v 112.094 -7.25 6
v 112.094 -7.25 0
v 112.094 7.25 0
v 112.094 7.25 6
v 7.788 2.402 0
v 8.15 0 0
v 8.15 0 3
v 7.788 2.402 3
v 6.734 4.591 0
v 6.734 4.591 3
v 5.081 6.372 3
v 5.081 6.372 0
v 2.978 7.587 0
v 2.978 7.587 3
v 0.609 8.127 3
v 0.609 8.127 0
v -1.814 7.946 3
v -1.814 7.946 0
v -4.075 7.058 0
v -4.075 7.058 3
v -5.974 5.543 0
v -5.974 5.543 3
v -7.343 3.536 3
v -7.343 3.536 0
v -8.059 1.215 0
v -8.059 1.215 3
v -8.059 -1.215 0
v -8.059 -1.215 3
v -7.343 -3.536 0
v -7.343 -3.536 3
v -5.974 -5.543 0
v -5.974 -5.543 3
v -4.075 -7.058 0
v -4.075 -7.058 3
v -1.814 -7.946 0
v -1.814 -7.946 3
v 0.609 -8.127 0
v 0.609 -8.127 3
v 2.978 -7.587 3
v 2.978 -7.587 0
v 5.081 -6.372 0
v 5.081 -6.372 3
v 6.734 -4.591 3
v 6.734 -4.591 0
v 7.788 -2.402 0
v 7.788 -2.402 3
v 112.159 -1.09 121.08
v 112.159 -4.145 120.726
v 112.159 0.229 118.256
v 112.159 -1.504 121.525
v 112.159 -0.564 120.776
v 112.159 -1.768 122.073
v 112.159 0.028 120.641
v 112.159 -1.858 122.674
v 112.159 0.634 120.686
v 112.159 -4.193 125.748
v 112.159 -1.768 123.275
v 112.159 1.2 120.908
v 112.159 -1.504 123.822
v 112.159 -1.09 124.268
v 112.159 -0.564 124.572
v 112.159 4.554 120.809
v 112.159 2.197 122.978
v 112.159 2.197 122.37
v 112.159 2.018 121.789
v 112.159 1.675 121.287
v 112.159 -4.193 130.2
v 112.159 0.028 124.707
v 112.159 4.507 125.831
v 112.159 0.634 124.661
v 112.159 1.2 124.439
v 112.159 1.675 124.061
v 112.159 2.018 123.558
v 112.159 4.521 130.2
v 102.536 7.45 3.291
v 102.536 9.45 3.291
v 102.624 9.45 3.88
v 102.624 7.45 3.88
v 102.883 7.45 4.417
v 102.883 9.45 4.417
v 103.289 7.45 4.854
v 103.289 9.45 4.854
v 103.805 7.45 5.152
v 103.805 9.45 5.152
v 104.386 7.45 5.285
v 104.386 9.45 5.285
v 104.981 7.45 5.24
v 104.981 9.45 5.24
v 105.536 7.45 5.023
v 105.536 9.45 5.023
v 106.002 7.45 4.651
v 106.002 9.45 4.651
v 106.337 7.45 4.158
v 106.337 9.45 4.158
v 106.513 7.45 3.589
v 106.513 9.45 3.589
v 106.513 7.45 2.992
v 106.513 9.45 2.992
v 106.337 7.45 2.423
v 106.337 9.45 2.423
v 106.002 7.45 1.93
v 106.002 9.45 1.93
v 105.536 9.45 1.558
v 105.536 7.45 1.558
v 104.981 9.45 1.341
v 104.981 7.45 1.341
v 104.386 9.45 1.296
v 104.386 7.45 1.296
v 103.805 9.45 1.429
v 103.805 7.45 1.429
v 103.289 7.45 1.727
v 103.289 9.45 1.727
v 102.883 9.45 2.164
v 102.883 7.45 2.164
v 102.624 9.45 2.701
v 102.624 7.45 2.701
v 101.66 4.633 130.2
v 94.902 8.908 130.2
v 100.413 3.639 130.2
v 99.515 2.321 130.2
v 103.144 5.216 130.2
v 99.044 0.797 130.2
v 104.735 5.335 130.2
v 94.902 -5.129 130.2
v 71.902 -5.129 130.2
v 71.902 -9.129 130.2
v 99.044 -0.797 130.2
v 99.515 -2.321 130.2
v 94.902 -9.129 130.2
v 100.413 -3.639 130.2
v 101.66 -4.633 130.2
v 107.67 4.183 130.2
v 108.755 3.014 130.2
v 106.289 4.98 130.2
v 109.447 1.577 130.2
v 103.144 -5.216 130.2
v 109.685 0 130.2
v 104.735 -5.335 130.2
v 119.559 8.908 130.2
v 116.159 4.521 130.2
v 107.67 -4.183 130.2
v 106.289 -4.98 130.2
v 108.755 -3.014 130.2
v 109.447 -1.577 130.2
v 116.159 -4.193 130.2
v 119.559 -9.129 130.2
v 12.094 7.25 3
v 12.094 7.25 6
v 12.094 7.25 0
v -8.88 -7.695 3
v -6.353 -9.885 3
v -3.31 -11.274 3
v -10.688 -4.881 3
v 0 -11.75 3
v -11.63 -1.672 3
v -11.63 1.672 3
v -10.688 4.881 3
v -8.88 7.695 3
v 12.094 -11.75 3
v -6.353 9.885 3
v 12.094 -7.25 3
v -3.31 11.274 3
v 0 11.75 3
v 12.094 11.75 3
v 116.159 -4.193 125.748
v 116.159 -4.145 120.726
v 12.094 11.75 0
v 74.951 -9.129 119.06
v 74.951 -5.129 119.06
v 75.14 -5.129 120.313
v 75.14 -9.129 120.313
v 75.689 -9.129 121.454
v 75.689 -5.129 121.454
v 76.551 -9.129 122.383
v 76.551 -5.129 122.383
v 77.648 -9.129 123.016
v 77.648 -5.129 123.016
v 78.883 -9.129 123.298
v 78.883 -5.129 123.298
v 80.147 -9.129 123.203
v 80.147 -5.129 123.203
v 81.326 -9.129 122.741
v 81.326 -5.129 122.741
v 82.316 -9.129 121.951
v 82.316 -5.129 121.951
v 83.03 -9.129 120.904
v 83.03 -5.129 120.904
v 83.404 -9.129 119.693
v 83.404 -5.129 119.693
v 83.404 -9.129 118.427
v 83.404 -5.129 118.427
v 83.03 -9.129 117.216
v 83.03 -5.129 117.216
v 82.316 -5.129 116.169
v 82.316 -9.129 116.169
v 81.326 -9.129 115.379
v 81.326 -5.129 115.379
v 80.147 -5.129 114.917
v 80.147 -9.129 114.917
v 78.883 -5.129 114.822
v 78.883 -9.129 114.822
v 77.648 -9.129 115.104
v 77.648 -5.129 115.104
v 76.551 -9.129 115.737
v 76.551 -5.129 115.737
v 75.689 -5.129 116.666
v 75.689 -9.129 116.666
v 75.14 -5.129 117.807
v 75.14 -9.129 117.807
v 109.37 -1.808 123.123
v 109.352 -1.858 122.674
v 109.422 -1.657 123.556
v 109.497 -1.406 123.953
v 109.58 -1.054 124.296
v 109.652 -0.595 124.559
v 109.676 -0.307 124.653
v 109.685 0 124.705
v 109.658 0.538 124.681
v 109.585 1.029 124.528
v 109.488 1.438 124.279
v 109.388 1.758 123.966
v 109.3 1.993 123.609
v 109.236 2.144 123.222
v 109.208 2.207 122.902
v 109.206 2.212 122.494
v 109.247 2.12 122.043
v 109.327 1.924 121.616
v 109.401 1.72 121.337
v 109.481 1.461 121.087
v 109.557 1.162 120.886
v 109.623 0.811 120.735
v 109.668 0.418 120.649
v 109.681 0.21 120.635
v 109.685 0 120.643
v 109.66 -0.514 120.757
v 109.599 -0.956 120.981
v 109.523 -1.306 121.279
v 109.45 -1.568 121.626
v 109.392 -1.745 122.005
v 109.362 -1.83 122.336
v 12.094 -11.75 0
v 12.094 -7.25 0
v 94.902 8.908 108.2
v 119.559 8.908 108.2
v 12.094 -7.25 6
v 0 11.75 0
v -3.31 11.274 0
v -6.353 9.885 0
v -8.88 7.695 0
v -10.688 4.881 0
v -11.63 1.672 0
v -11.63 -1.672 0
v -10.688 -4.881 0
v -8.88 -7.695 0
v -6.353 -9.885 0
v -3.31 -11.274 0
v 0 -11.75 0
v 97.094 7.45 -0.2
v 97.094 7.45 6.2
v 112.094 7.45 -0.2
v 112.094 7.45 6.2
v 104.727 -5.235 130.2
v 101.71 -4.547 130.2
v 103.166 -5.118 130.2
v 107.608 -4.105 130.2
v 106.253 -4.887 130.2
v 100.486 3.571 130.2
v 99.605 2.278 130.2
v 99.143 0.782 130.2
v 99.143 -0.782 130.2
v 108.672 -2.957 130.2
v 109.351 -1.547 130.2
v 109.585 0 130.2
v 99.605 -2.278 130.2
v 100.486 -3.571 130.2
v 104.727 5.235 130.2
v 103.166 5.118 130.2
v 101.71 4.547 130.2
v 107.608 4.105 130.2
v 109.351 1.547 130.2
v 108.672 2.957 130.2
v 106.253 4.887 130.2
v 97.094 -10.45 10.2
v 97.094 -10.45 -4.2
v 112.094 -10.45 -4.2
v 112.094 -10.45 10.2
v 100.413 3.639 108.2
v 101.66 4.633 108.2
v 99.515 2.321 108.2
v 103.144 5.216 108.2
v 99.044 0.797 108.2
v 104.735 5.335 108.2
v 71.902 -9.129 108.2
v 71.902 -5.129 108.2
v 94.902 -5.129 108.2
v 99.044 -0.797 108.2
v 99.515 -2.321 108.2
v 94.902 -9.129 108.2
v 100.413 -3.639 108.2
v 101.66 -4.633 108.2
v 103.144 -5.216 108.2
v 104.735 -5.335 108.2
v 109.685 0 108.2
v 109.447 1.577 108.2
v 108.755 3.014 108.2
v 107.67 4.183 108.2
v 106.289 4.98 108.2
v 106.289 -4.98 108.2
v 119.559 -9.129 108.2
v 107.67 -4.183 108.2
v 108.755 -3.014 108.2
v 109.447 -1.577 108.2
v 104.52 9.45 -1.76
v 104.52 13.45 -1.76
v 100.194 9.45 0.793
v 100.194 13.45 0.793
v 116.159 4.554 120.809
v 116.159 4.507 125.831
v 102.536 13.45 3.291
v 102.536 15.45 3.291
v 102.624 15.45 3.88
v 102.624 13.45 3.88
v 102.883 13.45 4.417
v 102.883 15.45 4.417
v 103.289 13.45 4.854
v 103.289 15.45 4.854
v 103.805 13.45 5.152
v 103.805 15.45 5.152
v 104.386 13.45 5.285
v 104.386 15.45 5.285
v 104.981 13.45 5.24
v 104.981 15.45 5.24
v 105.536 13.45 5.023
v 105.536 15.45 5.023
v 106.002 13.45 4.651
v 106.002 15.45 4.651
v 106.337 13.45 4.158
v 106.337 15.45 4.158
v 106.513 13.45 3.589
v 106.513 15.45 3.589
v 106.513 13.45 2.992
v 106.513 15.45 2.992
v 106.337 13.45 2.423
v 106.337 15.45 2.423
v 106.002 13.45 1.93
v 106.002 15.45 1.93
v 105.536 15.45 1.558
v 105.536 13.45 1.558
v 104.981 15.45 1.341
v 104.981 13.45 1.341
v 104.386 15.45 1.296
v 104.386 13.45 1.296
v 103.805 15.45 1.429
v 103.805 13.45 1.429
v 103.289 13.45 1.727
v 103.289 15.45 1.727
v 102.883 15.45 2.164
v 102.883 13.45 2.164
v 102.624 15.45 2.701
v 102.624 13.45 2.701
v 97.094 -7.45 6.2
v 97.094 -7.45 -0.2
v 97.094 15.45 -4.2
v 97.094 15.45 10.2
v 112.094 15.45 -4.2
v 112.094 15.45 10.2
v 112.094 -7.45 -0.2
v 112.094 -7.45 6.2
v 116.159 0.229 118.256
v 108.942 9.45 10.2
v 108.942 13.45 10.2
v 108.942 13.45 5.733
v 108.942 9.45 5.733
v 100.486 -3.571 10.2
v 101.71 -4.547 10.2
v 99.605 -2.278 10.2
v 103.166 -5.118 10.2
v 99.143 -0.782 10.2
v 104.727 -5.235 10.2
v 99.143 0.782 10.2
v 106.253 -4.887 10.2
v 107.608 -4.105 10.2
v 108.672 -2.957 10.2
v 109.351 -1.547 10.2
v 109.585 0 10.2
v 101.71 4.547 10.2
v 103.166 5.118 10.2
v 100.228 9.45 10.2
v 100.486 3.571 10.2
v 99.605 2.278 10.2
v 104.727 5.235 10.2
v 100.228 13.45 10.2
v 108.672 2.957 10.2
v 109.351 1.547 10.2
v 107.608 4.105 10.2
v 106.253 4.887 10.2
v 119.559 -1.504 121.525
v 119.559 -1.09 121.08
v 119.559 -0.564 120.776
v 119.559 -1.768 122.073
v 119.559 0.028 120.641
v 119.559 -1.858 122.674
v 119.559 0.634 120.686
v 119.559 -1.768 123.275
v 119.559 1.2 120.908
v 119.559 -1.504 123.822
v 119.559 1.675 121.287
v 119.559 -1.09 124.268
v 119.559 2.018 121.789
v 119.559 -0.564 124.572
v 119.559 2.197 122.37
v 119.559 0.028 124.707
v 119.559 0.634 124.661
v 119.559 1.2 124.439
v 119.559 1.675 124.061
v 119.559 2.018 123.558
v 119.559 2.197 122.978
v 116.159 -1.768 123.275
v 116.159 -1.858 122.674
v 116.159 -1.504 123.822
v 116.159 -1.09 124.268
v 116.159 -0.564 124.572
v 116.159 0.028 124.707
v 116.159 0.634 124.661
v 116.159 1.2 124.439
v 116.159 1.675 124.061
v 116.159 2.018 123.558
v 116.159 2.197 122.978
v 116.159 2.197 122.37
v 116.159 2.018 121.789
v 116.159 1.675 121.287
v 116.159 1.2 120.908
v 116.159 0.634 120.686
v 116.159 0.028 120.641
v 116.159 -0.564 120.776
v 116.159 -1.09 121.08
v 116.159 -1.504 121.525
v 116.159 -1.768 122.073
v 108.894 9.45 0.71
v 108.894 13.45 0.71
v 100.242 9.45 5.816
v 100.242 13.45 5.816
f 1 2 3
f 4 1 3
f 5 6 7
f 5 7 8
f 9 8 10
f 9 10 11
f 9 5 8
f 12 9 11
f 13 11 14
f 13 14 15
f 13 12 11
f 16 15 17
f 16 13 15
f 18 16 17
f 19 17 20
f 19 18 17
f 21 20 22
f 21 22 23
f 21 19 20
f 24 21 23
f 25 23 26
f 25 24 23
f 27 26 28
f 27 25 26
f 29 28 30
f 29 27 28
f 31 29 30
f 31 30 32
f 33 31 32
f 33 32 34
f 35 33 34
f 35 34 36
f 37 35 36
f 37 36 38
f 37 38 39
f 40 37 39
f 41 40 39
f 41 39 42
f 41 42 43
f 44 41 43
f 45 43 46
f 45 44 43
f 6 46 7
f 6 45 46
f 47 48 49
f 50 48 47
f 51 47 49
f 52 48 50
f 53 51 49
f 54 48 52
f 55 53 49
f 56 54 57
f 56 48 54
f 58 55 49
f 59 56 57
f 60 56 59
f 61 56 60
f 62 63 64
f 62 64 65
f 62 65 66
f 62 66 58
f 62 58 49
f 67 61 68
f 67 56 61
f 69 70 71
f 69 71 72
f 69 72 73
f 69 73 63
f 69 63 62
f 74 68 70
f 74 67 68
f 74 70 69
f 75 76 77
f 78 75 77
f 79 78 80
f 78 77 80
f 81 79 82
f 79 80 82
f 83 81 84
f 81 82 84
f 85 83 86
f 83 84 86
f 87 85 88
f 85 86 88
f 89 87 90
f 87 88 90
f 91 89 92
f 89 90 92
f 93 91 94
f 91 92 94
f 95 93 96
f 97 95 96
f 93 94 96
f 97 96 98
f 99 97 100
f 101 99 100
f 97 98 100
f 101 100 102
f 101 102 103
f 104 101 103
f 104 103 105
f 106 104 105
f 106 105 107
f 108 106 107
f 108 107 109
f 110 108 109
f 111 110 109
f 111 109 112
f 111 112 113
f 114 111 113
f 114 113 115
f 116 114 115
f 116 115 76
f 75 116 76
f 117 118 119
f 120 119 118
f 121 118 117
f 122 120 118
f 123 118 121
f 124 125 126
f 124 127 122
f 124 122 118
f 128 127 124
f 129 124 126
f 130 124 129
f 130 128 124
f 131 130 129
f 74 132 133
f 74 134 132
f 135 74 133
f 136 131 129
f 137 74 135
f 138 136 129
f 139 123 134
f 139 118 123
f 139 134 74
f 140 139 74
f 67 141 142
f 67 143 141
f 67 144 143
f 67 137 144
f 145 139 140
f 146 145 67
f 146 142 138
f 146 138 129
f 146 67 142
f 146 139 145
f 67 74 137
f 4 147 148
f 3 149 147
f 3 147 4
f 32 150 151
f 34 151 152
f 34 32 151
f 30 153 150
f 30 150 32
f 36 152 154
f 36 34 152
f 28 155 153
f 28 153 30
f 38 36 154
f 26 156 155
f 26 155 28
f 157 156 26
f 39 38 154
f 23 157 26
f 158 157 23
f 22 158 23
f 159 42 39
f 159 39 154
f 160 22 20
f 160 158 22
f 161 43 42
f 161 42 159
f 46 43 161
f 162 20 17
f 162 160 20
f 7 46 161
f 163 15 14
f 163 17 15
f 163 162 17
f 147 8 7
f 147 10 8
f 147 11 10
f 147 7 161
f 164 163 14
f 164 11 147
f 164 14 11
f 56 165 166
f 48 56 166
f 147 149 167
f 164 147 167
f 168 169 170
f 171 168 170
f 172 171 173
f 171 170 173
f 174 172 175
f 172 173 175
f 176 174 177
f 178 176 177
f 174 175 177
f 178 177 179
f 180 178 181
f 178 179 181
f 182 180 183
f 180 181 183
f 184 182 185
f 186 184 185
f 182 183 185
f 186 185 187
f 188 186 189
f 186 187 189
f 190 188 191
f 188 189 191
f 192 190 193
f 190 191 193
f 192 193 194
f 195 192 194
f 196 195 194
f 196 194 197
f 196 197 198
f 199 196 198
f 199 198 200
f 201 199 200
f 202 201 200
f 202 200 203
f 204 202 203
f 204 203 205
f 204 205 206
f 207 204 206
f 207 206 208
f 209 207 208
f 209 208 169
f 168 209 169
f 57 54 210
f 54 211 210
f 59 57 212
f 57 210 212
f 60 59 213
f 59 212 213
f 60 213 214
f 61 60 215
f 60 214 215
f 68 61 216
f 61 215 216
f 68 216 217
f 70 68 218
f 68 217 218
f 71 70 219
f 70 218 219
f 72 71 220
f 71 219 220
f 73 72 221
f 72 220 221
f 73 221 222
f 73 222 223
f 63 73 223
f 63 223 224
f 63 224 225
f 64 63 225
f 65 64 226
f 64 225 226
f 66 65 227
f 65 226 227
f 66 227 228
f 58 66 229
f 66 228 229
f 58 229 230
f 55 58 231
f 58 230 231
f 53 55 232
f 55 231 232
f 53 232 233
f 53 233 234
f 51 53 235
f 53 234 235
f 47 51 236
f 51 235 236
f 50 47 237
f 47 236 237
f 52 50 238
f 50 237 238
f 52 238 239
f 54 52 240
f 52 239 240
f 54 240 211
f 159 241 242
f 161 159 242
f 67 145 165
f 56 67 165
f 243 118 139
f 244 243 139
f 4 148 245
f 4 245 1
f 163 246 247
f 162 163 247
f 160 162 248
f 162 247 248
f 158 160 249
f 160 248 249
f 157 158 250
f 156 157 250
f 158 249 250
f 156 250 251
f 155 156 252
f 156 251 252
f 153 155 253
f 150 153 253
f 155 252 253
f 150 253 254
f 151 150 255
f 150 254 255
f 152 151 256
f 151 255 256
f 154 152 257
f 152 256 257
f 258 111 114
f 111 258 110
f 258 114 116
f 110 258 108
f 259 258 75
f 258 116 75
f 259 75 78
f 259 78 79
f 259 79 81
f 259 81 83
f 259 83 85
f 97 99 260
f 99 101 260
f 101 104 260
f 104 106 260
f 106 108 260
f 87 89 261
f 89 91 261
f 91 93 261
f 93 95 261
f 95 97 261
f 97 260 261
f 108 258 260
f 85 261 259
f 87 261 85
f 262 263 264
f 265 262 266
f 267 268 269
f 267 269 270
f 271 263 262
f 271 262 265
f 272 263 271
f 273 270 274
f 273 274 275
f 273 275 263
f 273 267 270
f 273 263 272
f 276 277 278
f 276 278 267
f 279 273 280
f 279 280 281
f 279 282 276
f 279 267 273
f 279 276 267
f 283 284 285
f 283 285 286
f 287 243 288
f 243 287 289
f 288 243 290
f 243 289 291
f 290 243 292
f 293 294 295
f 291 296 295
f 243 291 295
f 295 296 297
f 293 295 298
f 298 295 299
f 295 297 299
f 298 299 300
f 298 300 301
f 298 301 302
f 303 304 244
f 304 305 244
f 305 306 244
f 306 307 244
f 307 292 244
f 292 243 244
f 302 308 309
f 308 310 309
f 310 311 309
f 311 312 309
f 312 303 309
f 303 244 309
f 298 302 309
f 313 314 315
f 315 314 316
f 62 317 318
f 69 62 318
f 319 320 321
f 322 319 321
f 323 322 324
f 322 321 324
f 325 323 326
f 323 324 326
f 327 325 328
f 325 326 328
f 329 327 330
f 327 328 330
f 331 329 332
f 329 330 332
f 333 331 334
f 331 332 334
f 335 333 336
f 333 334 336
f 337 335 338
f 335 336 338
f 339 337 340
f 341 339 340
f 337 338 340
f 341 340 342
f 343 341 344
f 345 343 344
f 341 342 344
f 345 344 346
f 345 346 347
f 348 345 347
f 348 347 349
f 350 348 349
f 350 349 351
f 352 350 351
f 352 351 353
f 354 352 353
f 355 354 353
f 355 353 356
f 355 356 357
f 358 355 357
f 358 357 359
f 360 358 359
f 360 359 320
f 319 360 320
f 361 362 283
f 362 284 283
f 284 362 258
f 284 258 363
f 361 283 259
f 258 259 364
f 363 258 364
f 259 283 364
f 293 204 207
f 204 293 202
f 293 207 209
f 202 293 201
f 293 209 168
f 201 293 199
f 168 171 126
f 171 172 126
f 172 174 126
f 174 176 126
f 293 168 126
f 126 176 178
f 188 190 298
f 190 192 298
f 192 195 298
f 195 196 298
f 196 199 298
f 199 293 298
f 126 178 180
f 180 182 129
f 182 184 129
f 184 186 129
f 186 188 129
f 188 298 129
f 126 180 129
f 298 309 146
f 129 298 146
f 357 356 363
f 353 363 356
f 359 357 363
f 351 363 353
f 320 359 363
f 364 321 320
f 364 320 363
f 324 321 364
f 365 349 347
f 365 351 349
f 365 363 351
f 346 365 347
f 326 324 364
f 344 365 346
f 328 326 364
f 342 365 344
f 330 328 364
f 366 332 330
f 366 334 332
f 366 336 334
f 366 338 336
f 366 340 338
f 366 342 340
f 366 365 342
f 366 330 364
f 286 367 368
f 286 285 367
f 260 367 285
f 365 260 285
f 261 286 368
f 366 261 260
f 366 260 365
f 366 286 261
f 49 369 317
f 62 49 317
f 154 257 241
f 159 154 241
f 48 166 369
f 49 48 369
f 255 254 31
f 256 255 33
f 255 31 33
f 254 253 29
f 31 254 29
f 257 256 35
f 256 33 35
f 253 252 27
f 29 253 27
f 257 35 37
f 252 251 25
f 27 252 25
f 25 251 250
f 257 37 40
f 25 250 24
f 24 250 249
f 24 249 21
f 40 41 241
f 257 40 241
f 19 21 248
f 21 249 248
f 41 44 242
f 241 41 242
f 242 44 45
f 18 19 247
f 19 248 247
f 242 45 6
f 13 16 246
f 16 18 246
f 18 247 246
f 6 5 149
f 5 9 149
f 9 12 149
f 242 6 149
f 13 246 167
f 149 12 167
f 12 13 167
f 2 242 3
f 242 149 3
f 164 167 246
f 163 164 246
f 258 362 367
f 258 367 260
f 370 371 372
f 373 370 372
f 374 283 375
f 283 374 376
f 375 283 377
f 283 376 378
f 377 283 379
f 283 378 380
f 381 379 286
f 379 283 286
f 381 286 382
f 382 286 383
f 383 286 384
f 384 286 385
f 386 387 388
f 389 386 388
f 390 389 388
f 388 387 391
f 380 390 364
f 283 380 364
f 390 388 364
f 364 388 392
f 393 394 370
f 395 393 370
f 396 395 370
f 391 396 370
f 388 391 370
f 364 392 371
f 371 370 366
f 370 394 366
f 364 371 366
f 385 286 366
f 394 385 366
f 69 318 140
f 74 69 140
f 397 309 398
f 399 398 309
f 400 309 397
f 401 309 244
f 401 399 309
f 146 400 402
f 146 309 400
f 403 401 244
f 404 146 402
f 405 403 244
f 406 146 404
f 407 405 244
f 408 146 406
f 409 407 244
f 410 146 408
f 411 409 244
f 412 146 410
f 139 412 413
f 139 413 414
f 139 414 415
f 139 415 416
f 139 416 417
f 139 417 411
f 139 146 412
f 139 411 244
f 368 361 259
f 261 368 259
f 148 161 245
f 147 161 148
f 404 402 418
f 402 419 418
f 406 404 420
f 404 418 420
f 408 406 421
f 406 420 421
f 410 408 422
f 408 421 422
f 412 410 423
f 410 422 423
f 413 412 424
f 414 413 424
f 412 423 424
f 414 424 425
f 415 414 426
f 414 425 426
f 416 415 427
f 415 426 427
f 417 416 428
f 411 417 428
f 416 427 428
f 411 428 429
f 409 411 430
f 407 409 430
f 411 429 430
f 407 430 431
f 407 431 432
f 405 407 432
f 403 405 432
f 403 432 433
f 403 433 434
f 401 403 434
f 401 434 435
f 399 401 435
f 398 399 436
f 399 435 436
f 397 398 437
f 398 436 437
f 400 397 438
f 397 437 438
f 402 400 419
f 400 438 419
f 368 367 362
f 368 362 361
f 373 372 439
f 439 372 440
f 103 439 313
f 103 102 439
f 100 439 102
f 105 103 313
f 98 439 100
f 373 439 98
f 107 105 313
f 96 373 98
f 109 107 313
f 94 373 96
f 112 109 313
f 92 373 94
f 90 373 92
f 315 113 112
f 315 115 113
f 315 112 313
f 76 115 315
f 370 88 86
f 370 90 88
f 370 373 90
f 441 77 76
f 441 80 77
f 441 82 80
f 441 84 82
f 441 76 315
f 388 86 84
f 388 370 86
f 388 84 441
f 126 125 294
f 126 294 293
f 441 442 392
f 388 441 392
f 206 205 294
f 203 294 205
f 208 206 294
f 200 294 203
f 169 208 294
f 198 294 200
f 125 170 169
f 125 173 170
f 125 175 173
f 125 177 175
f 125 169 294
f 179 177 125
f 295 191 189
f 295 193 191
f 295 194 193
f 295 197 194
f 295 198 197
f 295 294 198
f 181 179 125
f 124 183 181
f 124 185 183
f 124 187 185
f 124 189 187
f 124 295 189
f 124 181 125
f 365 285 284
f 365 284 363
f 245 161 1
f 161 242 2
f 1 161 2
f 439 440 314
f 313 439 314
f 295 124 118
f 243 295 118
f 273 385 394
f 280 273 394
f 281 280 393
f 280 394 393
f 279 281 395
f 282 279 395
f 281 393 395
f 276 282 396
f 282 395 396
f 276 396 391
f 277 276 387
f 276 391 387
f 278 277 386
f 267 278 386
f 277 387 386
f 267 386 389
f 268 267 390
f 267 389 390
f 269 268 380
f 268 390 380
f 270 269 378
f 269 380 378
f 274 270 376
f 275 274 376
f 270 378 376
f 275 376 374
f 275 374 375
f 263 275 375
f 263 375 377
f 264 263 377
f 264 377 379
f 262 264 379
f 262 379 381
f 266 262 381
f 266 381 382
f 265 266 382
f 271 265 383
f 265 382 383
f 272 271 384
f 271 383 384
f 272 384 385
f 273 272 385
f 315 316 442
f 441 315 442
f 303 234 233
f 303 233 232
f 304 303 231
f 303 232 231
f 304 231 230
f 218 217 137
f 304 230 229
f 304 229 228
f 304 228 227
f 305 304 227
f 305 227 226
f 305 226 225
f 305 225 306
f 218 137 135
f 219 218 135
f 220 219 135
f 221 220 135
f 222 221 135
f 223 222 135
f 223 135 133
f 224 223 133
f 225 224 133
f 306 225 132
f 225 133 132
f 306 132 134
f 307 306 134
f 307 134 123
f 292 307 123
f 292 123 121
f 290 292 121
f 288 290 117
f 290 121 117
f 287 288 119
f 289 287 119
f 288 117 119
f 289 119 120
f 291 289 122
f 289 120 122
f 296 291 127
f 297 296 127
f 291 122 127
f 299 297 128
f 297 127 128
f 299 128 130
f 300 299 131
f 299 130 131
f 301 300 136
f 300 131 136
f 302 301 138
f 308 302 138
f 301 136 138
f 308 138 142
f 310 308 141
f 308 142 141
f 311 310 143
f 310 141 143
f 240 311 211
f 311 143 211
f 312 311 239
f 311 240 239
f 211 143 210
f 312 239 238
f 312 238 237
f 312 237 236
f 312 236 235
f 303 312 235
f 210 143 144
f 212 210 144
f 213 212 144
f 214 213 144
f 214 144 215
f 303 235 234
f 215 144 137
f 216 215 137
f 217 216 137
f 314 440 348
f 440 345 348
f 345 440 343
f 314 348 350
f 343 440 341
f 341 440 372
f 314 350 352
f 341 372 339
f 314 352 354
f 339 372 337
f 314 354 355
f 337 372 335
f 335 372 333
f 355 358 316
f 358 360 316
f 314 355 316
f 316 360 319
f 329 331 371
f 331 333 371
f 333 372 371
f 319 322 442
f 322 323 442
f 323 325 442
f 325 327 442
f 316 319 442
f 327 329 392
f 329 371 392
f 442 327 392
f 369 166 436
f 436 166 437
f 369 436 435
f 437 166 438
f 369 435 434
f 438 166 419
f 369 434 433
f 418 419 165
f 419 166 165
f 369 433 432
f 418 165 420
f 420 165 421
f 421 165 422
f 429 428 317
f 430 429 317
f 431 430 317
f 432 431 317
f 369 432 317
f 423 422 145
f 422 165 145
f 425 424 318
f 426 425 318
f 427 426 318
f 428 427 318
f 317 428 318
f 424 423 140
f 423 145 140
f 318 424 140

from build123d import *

# Parameters (mm, degrees)
F0_R      = 8.15
F1_DEPTH  = 3
F2_W      = 100
F2_H      = 14.5
F3_DEPTH  = 6
F4_W      = 25.9
F4_H      = 14.4
F4_W_2    = 14.9
F4_H_2    = 6.4
F5_DEPTH  = 15
F7_DEPTH  = 4
F10_R     = 2
F11_DEPTH = 8
F12_R     = 5.25
F13_DEPTH = 120
F14_W     = 24.6563926339
F14_H     = 18.0372335017
F14_R     = 5.35
F15_DEPTH = 22
F17_DEPTH = 4
F20_W     = 4
F20_H     = 22
F21_DEPTH = 23
F22_R     = 4.25
F23_DEPTH = 6.9
F24_R     = 2.0388444007
F25_DEPTH = 8


with BuildPart() as f1:
    # F0 (on Top) → F1 (new body)
    with BuildSketch(Plane.XY):
        with BuildLine():
            Line((12.0938429609, 11.75), (0, 11.75))
            ThreePointArc((0, 11.75), (-11.75, 0), (0, -11.75))
            Line((0, -11.75), (12.0938429609, -11.75))
            Line((12.0938429609, -11.75), (12.0938429609, 11.75))
        make_face()
        Circle(F0_R, mode=Mode.SUBTRACT)
    extrude(amount=F1_DEPTH)

    # F2 (on Top) → F3 (join)
    with BuildSketch(Plane.XY):
        with Locations((62.0938429609, 0)):
            Rectangle(F2_W, F2_H)
    extrude(amount=F3_DEPTH)


with BuildPart() as f5:
    # F4 (on face) → F5 (new body)
    with BuildSketch(Plane.YZ.offset(112.0938429609)):
        with Locations((2.5, 3)):
            Rectangle(F4_W, F4_H)
        with Locations((0, 3)):
            Rectangle(F4_W_2, F4_H_2, mode=Mode.SUBTRACT)
    extrude(amount=-F5_DEPTH)


with BuildPart() as f7:
    # F6 (on face) → F7 (new body)
    with BuildSketch(Plane(origin=(0, 15.45, 0), x_dir=(-1, 0, 0), z_dir=(0, 1, 0))):
        Polygon((-104.5203484448, -1.759813661), (-100.1944865702, 0.7930120365), (-100.2423675383, 5.8157311619), (-100.2277748773, 10.2), (-108.9419722557, 10.2), (-108.9419722557, 5.7327988924), (-108.8940912876, 0.710079767), align=None)
    extrude(amount=-F7_DEPTH)


with BuildPart() as f7_1:
    # F8: moved
    add(f7.part.moved(Location((0, -2, 0))))


with BuildPart() as f5_1:
    add(f5.part)

    # F9: cut F7
    add(f7_1.part, mode=Mode.SUBTRACT)

    # F10 (on face) → F11 (cut)
    with BuildSketch(Plane(origin=(0, 15.45, 0), x_dir=(-1, 0, 0), z_dir=(0, 1, 0))):
        with Locations((-104.5355323519, 3.2905018547)):
            Circle(F10_R)
    extrude(amount=-F11_DEPTH, mode=Mode.SUBTRACT)

    # F12 (on face) → F13 (join)
    with BuildSketch(Plane.XY.offset(10.2)):
        with Locations((104.3347269297, 0)):
            Circle(F12_R)
    extrude(amount=F13_DEPTH)


with BuildPart() as f15:
    # F14 (on face) → F15 (new body)
    with BuildSketch(Plane.XY.offset(130.2)):
        with Locations((107.2306148708, -0.1103188843)):
            Rectangle(F14_W, F14_H)
        with Locations((104.3347269297, 0)):
            Circle(F14_R, mode=Mode.SUBTRACT)
    extrude(amount=-F15_DEPTH)


with BuildPart() as f17:
    # F16 (on face) → F17 (new body)
    with BuildSketch(Plane.YZ.offset(119.5588111877)):
        Polygon((0.228611862, 118.2558574952), (4.5544737366, 120.8086831927), (4.5065927685, 125.8314023181), (4.5211332695, 130.2), (-4.1930119489, 130.2), (-4.1930119489, 125.7484700486), (-4.1451309808, 120.7257509232), align=None)
    extrude(amount=-F17_DEPTH)


with BuildPart() as f17_1:
    # F18: moved
    add(f17.part.moved(Location((-3.4, 0, 0))))


with BuildPart() as f15_1:
    add(f15.part)

    # F19: cut F17
    add(f17_1.part, mode=Mode.SUBTRACT)

    # F20 (on face) → F21 (join)
    with BuildSketch(Plane(origin=(94.9024185538, 0, 0), x_dir=(0, -1, 0), z_dir=(-1, 0, 0))):
        with Locations((7.1289356351, 119.2)):
            Rectangle(F20_W, F20_H)
    extrude(amount=F21_DEPTH)

    # F22 (on face) → F23 (cut)
    with BuildSketch(Plane(origin=(0, -5.1289356351, 0), x_dir=(-1, 0, 0), z_dir=(0, 1, 0))):
        with Locations((-79.2009755969, 119.0599501133)):
            Circle(F22_R)
    extrude(amount=-F23_DEPTH, mode=Mode.SUBTRACT)

    # F24 (on face) → F25 (cut, symmetric)
    with BuildSketch(Plane(origin=(116.1588111877, 0, 0), x_dir=(0, -1, 0), z_dir=(-1, 0, 0))):
        with Locations((-0.1807307642, 122.6737608395)):
            Circle(F24_R)
    extrude(amount=F25_DEPTH, both=True, mode=Mode.SUBTRACT)


solid = Compound([f1.part, f5_1.part, f15_1.part])
